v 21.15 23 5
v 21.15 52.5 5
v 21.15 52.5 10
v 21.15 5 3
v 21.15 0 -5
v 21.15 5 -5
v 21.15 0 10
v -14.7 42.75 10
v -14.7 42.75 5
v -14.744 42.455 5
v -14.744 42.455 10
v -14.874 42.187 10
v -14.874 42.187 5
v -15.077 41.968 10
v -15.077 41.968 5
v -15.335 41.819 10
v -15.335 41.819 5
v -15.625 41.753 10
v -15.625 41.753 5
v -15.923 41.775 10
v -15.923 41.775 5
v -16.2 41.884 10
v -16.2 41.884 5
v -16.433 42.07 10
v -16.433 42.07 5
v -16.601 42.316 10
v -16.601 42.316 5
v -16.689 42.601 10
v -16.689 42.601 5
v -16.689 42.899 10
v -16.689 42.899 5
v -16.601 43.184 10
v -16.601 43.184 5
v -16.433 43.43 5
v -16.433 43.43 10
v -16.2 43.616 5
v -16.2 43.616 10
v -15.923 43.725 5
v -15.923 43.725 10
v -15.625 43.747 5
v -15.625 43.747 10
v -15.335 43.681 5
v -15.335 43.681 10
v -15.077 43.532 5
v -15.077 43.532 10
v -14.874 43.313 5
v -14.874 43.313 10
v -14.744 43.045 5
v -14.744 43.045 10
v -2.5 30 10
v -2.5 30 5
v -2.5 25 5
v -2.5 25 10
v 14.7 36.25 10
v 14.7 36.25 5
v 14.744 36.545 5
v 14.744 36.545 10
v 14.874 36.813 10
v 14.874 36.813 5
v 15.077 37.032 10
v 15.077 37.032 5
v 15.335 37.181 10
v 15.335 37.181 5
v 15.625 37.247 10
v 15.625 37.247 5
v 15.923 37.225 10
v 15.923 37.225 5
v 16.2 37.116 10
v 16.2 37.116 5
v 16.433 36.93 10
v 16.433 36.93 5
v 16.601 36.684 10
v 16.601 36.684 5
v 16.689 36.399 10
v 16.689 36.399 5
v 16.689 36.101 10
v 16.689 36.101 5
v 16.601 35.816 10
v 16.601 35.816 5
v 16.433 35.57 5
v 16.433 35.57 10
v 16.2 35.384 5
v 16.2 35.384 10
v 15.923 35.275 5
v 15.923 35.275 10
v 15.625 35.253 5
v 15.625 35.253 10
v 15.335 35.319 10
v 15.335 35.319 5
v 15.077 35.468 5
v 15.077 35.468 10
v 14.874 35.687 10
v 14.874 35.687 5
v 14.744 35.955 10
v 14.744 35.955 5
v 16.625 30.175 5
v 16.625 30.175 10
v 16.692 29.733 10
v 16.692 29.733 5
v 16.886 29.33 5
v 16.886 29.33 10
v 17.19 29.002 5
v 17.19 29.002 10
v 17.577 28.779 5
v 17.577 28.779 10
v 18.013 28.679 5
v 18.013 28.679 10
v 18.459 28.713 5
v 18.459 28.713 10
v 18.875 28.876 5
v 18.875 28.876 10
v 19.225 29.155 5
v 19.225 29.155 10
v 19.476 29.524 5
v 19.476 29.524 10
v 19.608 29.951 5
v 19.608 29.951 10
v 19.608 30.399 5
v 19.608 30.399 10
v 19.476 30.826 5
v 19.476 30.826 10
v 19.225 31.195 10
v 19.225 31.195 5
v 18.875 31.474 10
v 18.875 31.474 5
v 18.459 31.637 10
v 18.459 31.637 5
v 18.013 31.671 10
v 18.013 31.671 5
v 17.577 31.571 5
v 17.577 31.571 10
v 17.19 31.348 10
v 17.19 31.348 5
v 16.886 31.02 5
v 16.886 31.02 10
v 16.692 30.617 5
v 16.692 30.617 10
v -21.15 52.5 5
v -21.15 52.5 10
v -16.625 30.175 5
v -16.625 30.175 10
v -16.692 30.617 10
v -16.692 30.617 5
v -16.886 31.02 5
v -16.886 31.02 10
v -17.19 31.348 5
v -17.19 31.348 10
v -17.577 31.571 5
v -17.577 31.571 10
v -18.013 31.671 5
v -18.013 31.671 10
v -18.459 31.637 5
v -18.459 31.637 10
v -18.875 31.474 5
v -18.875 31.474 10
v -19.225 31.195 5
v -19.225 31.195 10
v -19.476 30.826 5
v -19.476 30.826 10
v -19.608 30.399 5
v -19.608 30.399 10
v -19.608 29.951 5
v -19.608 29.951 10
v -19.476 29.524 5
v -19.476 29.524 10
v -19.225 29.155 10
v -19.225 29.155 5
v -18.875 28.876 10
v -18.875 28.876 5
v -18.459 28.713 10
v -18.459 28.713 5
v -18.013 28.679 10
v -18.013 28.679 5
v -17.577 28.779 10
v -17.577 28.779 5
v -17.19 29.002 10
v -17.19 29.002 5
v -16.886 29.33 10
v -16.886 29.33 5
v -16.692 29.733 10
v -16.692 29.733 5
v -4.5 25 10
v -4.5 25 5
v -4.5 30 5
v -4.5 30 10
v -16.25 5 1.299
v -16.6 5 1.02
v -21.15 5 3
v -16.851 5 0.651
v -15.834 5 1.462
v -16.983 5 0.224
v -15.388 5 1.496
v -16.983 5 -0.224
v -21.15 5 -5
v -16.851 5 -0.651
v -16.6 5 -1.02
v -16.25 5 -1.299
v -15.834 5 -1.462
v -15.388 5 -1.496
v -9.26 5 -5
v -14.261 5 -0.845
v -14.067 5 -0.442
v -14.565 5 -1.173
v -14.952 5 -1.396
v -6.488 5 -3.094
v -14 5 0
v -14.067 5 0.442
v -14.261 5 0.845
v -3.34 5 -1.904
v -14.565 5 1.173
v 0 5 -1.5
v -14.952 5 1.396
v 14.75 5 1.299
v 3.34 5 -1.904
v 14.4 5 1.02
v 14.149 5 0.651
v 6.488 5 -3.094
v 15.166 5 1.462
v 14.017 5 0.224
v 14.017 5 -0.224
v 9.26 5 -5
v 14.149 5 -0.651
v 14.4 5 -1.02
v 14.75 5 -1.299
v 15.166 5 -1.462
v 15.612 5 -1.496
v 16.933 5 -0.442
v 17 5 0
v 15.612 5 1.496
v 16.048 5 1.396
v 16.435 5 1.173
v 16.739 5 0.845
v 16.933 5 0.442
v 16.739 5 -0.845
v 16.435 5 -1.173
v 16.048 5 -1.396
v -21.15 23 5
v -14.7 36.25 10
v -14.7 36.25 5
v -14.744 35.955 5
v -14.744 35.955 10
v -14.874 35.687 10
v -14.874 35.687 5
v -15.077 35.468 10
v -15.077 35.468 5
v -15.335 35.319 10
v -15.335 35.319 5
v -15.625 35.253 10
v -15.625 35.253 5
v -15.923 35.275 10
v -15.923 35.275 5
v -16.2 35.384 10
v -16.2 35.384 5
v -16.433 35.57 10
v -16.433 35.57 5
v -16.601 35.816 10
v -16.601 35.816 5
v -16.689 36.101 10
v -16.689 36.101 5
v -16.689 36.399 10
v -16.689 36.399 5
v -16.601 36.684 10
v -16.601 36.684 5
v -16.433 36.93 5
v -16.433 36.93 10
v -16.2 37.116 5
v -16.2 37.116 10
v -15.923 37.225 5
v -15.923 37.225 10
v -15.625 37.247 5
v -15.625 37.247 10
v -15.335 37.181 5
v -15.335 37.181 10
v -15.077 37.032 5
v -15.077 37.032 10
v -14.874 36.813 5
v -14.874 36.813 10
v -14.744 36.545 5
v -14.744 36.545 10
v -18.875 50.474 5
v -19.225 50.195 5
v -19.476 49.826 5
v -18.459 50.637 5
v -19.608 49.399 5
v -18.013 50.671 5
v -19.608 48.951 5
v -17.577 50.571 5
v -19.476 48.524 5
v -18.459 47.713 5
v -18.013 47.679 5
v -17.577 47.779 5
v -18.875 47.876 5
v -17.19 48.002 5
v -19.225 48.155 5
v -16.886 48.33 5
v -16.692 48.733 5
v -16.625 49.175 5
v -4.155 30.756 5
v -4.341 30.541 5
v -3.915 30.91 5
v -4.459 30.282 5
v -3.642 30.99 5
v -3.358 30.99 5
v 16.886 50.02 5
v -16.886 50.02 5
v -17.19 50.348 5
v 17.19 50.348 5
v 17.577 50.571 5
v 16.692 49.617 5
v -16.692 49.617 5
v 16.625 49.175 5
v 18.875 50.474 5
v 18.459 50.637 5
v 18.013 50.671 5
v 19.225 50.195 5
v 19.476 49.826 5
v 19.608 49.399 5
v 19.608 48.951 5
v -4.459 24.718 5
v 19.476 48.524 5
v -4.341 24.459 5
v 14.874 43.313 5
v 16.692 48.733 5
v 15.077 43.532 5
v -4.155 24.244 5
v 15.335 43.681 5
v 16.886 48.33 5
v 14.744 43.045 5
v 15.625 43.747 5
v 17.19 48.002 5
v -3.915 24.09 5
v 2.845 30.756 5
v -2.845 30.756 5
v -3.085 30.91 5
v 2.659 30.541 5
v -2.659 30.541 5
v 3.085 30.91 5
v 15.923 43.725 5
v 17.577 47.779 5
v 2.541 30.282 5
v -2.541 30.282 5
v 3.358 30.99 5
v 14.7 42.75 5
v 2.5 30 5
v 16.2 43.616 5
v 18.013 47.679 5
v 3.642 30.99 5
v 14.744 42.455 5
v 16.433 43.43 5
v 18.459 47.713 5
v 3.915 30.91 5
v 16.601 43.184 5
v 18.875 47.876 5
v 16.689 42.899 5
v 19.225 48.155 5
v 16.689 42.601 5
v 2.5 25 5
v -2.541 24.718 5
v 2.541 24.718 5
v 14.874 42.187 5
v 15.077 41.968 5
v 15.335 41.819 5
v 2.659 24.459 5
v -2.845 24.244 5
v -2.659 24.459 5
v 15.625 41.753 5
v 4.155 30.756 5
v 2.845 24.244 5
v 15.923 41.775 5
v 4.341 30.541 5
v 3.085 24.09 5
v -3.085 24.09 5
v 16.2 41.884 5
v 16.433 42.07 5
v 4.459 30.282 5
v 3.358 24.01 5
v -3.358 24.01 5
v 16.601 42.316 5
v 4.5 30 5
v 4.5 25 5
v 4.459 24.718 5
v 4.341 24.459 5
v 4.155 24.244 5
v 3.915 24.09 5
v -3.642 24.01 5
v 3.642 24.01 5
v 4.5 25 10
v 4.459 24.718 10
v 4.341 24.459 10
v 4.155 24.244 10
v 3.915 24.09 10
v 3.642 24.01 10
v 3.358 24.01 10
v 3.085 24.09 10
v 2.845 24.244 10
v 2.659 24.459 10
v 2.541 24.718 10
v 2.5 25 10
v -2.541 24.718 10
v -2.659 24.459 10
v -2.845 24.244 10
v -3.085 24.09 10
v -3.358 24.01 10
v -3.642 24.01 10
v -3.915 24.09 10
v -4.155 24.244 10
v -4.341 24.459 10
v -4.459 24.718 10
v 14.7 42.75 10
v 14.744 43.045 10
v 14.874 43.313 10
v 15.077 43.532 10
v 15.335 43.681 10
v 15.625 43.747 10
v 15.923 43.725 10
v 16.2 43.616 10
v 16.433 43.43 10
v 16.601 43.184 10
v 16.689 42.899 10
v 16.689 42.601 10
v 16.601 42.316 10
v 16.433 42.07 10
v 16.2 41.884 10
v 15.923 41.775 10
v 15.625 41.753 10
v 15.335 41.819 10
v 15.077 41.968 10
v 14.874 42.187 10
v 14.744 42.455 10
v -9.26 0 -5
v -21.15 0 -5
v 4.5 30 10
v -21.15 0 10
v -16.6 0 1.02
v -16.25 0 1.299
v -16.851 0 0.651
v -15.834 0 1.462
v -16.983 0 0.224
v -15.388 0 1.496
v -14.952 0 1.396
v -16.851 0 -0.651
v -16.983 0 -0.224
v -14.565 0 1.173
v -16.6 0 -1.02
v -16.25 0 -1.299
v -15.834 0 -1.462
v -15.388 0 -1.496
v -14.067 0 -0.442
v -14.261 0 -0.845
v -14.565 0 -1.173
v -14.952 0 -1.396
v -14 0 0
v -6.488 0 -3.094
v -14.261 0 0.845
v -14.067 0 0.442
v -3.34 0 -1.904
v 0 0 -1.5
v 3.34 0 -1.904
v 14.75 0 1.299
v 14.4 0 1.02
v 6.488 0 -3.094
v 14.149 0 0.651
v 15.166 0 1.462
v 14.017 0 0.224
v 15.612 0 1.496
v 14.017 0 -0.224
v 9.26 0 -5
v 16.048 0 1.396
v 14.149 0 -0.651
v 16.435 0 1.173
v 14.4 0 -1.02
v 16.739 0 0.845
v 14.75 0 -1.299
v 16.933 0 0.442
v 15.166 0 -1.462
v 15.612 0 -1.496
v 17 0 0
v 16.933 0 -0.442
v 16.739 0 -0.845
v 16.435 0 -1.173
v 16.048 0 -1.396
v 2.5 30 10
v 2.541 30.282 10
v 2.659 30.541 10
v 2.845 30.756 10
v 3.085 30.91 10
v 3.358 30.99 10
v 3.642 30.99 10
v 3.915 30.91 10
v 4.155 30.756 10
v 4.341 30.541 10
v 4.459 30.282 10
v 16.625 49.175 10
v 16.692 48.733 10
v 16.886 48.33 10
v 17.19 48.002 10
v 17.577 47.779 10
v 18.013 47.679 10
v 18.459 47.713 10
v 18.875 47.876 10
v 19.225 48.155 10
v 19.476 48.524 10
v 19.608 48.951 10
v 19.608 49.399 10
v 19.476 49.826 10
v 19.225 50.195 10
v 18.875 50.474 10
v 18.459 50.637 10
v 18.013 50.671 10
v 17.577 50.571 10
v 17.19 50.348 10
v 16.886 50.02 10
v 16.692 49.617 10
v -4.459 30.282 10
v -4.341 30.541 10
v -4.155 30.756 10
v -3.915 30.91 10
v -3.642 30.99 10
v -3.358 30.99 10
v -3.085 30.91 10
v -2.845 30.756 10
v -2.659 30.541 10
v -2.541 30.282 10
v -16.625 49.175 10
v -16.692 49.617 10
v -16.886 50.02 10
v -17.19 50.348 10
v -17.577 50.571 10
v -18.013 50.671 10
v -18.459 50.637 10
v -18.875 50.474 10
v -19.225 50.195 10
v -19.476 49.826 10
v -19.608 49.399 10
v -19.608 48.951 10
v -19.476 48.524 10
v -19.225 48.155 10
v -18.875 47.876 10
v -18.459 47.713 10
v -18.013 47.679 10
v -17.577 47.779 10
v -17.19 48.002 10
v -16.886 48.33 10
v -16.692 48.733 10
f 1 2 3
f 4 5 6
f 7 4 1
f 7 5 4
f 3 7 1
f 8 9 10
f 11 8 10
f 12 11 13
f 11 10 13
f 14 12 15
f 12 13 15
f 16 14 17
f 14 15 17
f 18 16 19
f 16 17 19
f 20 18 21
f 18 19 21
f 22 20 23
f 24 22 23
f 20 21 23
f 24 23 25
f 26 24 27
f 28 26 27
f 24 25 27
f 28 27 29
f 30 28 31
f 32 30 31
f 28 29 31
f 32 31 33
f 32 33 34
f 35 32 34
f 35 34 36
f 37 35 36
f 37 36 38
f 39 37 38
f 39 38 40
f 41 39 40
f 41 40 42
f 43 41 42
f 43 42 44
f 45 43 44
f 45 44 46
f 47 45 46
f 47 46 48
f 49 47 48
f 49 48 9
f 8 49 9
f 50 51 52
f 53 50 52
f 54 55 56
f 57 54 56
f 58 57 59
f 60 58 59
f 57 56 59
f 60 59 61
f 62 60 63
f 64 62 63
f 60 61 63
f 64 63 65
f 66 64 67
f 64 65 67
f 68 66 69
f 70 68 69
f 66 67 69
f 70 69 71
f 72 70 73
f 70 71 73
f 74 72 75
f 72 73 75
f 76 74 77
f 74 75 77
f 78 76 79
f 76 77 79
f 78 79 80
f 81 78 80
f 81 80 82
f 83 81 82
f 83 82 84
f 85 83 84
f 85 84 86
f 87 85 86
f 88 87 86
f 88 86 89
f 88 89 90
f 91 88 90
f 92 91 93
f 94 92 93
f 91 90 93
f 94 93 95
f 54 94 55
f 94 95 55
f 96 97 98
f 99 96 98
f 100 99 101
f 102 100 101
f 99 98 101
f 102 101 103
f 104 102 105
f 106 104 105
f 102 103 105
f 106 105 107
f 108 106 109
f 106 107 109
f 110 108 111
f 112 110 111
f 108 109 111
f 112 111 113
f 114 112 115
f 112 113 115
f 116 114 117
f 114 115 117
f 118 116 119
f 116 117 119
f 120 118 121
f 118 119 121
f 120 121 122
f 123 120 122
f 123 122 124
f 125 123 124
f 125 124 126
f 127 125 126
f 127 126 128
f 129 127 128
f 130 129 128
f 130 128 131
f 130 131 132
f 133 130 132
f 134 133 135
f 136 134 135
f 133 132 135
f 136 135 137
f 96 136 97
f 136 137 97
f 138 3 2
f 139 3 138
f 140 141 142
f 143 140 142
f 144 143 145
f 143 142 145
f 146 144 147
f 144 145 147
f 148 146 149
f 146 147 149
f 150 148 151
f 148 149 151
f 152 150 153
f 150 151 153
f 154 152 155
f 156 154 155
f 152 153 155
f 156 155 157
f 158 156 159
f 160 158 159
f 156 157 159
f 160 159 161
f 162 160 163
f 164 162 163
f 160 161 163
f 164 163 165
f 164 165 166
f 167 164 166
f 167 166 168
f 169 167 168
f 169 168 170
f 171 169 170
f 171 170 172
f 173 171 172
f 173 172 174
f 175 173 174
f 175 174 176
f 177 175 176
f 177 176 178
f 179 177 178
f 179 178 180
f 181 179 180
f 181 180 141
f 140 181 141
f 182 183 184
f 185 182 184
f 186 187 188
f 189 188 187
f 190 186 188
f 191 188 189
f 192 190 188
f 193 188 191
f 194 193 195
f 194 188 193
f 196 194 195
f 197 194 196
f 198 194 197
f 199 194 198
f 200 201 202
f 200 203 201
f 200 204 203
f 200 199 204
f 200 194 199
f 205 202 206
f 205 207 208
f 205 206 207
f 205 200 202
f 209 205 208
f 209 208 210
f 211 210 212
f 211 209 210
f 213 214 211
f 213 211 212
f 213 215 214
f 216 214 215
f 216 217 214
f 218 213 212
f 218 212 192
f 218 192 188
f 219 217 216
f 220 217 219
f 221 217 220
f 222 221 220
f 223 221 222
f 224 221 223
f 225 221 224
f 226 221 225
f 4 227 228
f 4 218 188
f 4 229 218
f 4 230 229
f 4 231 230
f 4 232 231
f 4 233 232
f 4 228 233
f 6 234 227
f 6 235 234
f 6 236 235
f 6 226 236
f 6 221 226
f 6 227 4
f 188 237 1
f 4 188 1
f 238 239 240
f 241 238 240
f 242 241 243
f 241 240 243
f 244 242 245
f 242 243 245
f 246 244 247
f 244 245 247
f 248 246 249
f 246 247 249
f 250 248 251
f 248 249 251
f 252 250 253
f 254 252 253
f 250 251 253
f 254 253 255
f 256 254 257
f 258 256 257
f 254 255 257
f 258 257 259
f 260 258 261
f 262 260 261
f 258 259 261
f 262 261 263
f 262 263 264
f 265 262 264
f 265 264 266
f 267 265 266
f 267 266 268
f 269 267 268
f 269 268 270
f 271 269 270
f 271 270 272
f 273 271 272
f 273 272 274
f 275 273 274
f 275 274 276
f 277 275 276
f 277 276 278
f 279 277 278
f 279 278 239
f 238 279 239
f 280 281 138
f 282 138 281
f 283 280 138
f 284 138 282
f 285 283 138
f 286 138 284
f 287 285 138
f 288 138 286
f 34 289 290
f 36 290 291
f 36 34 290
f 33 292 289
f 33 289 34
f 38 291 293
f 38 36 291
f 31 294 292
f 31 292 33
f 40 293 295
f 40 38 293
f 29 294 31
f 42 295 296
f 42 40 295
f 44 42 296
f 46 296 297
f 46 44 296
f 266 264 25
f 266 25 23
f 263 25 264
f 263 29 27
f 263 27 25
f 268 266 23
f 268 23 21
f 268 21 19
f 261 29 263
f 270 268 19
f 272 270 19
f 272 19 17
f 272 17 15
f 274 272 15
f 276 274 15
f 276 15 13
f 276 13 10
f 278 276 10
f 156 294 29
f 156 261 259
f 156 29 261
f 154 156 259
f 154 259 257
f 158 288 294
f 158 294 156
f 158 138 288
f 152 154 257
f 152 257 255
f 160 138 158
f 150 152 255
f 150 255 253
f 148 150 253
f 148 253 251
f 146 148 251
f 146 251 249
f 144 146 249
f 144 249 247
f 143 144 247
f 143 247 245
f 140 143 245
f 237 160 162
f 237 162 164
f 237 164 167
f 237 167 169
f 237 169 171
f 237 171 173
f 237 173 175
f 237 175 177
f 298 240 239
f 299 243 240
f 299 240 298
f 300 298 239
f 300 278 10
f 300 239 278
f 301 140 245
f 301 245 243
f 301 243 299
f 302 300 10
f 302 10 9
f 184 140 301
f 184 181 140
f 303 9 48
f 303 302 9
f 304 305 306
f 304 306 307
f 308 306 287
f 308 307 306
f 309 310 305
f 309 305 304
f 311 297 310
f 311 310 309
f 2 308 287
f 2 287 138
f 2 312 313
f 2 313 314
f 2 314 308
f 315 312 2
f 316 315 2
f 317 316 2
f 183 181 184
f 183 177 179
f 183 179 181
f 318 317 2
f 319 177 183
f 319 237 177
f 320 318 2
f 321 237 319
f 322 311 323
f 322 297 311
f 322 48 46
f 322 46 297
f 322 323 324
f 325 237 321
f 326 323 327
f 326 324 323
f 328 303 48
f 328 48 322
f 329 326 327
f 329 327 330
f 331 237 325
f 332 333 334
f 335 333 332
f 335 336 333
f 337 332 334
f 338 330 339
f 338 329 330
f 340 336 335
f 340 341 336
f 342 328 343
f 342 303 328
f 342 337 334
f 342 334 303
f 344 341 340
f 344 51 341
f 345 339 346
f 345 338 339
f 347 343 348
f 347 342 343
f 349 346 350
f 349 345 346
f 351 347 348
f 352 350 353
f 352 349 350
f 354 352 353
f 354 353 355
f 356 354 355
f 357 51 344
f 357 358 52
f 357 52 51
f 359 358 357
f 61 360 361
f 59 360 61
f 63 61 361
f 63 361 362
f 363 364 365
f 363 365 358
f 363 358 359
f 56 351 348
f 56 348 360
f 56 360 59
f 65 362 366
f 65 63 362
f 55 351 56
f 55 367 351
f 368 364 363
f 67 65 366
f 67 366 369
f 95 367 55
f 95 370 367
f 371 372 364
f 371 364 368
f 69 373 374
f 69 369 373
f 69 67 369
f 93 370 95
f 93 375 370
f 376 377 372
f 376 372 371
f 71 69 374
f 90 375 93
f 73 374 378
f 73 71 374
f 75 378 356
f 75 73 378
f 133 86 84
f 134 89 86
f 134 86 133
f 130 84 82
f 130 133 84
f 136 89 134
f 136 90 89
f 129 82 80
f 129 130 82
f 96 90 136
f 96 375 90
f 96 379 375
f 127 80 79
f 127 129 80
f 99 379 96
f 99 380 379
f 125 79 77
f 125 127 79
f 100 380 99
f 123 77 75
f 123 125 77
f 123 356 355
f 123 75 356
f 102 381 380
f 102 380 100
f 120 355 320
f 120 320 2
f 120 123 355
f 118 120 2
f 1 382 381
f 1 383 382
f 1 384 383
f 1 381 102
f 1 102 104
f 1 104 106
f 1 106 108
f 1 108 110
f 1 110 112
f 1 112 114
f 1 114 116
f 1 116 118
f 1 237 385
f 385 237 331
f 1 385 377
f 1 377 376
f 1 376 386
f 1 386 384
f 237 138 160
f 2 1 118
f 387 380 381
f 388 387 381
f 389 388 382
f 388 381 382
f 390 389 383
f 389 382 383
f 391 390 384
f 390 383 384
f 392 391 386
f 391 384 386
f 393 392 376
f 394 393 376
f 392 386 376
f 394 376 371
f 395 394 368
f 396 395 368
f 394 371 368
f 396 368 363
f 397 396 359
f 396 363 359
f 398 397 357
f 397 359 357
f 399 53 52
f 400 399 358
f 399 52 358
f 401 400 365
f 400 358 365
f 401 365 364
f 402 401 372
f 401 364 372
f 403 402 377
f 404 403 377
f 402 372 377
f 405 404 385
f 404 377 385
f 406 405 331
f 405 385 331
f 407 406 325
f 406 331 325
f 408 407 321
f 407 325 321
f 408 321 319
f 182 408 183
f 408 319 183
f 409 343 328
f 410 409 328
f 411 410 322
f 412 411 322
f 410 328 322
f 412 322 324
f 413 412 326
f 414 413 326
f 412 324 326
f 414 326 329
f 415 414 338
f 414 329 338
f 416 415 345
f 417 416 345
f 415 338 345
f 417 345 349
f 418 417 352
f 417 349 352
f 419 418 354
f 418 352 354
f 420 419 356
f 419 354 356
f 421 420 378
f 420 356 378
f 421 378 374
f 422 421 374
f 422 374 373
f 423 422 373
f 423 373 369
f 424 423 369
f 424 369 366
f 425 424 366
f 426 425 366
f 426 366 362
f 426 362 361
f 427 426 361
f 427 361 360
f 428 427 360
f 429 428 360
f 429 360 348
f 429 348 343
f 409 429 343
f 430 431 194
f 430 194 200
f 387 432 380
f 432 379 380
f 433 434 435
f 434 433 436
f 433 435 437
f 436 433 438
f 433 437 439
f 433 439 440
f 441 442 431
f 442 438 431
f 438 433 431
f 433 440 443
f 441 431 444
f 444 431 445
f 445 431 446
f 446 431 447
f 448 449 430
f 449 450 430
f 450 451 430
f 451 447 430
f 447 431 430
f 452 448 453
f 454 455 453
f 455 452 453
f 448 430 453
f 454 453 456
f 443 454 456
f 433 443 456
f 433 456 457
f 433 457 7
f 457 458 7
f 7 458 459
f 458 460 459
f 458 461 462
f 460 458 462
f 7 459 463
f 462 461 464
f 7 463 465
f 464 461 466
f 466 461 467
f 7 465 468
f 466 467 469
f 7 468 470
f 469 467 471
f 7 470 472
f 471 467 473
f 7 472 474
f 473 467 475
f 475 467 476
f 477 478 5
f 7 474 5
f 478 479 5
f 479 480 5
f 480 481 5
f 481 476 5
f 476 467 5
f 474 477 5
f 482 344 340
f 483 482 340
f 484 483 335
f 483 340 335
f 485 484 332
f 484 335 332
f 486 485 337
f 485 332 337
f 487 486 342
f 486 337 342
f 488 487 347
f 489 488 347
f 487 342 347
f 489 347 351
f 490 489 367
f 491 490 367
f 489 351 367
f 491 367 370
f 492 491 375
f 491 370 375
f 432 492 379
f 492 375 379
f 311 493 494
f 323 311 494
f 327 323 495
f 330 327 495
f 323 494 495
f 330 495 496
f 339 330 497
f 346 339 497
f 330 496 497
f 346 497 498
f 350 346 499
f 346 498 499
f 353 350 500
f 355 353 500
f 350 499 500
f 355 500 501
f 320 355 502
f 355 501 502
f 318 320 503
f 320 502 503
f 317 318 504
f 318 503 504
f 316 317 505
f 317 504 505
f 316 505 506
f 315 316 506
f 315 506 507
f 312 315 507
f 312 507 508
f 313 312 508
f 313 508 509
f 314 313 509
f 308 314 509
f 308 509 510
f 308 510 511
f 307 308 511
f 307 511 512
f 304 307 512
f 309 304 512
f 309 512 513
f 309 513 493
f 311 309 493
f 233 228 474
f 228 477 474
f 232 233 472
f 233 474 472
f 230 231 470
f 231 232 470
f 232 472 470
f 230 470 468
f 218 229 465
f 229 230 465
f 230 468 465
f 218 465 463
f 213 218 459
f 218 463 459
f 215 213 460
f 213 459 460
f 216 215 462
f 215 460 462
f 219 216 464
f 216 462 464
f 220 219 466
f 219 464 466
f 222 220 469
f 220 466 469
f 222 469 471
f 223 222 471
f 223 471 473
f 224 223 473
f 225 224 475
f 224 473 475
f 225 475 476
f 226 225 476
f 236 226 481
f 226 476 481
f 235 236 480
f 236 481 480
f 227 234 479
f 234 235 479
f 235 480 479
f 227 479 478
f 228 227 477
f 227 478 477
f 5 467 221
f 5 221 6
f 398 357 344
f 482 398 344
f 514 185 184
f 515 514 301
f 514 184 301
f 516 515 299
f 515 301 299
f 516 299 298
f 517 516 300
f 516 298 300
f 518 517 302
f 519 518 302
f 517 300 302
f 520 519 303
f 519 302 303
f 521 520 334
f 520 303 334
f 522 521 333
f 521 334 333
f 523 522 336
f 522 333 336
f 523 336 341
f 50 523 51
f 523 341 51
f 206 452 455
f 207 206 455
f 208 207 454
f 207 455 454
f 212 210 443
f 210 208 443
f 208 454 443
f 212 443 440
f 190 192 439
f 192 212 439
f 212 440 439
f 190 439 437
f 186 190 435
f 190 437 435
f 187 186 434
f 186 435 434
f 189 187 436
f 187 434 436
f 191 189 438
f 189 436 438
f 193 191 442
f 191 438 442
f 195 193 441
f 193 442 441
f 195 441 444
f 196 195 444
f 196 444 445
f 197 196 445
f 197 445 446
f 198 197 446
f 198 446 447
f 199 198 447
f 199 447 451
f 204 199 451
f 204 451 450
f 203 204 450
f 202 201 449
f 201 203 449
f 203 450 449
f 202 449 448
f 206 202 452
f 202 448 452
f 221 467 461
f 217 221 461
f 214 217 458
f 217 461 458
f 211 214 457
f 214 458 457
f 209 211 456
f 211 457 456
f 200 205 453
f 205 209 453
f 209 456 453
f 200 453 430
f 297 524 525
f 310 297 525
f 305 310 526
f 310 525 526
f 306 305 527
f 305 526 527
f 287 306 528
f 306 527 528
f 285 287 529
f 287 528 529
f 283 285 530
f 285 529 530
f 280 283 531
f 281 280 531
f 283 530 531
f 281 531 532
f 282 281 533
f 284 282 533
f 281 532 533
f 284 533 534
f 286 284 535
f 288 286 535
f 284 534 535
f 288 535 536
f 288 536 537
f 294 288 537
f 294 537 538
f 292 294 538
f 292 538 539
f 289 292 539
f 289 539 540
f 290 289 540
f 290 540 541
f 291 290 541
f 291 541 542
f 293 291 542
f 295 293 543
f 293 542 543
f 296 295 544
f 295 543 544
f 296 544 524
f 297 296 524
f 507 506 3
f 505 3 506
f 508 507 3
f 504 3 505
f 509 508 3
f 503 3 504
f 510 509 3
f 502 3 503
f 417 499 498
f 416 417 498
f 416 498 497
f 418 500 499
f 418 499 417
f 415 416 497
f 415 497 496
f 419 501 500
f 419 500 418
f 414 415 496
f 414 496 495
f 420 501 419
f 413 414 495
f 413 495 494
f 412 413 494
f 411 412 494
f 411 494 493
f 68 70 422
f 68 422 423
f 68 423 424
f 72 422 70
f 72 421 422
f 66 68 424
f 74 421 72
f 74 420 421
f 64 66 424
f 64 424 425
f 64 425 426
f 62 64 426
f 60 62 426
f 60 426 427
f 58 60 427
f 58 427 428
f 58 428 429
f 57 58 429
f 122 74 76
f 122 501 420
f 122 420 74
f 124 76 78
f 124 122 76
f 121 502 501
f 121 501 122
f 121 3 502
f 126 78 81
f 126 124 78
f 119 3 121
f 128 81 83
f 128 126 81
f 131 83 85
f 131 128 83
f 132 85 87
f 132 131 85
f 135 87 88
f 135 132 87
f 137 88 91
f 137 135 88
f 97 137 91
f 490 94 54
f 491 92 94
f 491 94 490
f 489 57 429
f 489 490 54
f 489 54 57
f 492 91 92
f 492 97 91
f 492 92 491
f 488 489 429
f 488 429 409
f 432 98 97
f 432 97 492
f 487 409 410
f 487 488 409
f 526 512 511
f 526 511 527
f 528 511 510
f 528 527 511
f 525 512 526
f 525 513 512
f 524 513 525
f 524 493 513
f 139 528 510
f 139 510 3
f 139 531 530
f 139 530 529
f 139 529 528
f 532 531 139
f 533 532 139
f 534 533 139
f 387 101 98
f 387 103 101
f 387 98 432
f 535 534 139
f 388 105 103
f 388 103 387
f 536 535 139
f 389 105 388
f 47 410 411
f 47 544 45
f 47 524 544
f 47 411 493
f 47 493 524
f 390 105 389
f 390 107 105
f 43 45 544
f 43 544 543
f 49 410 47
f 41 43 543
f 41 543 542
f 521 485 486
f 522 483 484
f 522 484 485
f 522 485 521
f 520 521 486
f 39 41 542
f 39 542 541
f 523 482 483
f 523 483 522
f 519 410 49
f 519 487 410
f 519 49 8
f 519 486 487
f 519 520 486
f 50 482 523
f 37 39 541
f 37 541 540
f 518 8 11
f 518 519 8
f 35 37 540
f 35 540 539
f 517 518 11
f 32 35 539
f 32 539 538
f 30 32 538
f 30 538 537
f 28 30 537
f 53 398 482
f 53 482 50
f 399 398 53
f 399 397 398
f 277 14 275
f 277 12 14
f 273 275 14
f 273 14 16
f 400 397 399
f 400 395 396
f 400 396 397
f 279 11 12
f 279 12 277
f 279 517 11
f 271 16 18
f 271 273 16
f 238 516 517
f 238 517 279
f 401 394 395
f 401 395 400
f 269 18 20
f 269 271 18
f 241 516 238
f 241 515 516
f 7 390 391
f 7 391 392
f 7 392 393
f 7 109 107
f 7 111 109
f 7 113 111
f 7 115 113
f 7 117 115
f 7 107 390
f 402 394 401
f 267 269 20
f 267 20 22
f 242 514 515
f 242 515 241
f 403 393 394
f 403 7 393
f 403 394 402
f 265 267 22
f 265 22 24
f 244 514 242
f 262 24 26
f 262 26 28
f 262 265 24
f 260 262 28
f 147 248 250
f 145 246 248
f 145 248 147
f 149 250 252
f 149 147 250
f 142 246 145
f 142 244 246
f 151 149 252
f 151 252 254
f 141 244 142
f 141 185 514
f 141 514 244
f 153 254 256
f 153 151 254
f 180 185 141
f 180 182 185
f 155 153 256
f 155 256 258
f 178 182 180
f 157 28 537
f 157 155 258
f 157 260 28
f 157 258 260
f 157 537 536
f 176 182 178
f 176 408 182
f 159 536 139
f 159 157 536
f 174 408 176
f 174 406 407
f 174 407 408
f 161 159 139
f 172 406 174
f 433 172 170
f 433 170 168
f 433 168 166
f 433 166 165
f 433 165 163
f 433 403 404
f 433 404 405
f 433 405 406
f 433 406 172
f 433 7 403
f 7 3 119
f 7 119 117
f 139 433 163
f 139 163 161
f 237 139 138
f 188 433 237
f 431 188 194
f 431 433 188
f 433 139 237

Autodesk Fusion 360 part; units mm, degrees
sketch "Sketch1" plane through (0, 0, 0) normal (0, 1, 0) x (1, 0, 0)
  line L0 (-21.15, 5) -> (21.15, 5)
  line L1 (21.15, 5) -> (21.15, -10)
  line L2 (21.15, -10) -> (-21.15, -10)
  line L3 (-21.15, -10) -> (-21.15, 5)
  line L4 (-15.5, 0) -> (15.5, 0) construction
  circle A0 centre (-15.5, 0) radius 1.5
  circle A1 centre (15.5, 0) radius 1.5
  circle A2 centre (0, 15.5) radius 14
  dimension "d1" = 42.3
  dimension "d2" = 15
  dimension "d3" = 31
  dimension "d4" = 5.65
  dimension "d5" = 3
  dimension "d6" = 3
  dimension "d9" = 28
  dimension "d13" = 15.5
  dimension "d14" = 5
extrude "Extrude1" add sketch "Sketch1" along normal blind 5 contours L0 L1 L2 L3 A2
sketch "Sketch2" plane through (0, 5, 0) normal (0, 1, 0) x (-1, 0, 0)
  line L0 (21.15, 5) -> (-21.15, 5)
  line L1 (-21.15, 5) -> (-21.15, 10)
  line L2 (-21.15, 10) -> (21.15, 10)
  line L3 (21.15, 10) -> (21.15, 5)
  circle A0 centre (-15.5, 0) radius 1.5
  circle A1 centre (15.5, 0) radius 1.5
  line L4 (-21.15, 10) -> (-21.15, -5)
  line L5 (-21.15, -5) -> (-9.2601, -5)
  arc A2 (9.2601, -5) -> (-9.2601, -5) centre (0, -15.5) ccw
  line L6 (9.2601, -5) -> (21.15, -5)
  line L7 (21.15, -5) -> (21.15, 10)
  line L8 (21.15, 10) -> (-21.15, 10)
  dimension "d22" = 5
  dimension "d23" = 42.3
extrude "Extrude2" add sketch "Sketch2" along normal blind 47.5 contours L0 L1 L2 L3 L4 L7 L8
sketch "Sketch3" plane through (0, 0, 5) normal (0, 0, -1) x (-1, 0, 0)
  line L0 (-15.7, 42.75) -> (-15.7, 36.25) construction
  circle A0 centre (-15.7, 42.75) radius 1
  circle A1 centre (-15.7, 36.25) radius 1
  line L1 (-21.15, 52.5) -> (21.15, 52.5)
  line L2 (0, 52.5) -> (0, 12.5) construction
  line L3 (-4.5, 30) -> (-4.5, 25)
  arc A2 (-4.5, 25) -> (-2.5, 25) centre (-3.5, 25) ccw
  line L4 (-2.5, 25) -> (-2.5, 30)
  arc A3 (-2.5, 30) -> (-4.5, 30) centre (-3.5, 30) ccw
  line L5 (-3.5, 30) -> (-3.5, 25) construction
  dimension "d26" = 6.5
  dimension "d27" = 2
  dimension "d28" = 2
  dimension "d30" = 5.45
  dimension "d32" = 2
  dimension "d33" = 5
  dimension "d34" = 3.5
  dimension "d35" = 25
  dimension "d51" = 42.75
extrude "Extrude3" cut sketch "Sketch3" against normal through all
mirror "Mirror1" about plane through (0, 0, 0) normal (1, 0, 0) of "Extrude3"
sketch "Sketch4" plane through (0, 0, 5) normal (0, 0, -1) x (-1, 0, 0)
  circle A0 centre (15.7, 42.75) radius 1
  circle A1 centre (15.7, 36.25) radius 1
  circle A2 centre (-15.7, 42.75) radius 1
  circle A3 centre (-15.7, 36.25) radius 1
  circle A4 centre (15.7, 42.75) radius 2.5
  circle A5 centre (15.7, 36.25) radius 1
  circle A6 centre (15.7, 36.25) radius 2.5
  circle A7 centre (-15.7, 42.75) radius 2.5
  circle A8 centre (-15.7, 36.25) radius 2.5
  dimension "d37" = 5
  dimension "d38" = 5
  dimension "d39" = 5
  dimension "d40" = 5
chamfer "Chamfer1" distance 2 distance2 18 1 edges at (0, 5, 5) measured on face at (0, 5, 2.8333)
sketch "Sketch5" plane through (0, 0, 10) normal (0, 0, 1) x (1, 0, 0)
  line L0 (-18.125, 49.175) -> (-18.125, 30.175)
  circle A0 centre (-18.125, 49.175) radius 1.5
  circle A1 centre (-18.125, 30.175) radius 1.5
  line L1 (-21.15, 0) -> (-21.15, 52.5)
  circle A2 centre (-15.7, 42.75) radius 1
  dimension "d45" = 19
  dimension "d46" = 3
  dimension "d47" = 3
  dimension "d49" = 6.425
  dimension "d50" = 2.425
extrude "Extrude5" cut sketch "Sketch5" against normal through all contours A1 | A0
mirror "Mirror2" about plane through (0, 0, 0) normal (1, 0, 0) of "Extrude5"
